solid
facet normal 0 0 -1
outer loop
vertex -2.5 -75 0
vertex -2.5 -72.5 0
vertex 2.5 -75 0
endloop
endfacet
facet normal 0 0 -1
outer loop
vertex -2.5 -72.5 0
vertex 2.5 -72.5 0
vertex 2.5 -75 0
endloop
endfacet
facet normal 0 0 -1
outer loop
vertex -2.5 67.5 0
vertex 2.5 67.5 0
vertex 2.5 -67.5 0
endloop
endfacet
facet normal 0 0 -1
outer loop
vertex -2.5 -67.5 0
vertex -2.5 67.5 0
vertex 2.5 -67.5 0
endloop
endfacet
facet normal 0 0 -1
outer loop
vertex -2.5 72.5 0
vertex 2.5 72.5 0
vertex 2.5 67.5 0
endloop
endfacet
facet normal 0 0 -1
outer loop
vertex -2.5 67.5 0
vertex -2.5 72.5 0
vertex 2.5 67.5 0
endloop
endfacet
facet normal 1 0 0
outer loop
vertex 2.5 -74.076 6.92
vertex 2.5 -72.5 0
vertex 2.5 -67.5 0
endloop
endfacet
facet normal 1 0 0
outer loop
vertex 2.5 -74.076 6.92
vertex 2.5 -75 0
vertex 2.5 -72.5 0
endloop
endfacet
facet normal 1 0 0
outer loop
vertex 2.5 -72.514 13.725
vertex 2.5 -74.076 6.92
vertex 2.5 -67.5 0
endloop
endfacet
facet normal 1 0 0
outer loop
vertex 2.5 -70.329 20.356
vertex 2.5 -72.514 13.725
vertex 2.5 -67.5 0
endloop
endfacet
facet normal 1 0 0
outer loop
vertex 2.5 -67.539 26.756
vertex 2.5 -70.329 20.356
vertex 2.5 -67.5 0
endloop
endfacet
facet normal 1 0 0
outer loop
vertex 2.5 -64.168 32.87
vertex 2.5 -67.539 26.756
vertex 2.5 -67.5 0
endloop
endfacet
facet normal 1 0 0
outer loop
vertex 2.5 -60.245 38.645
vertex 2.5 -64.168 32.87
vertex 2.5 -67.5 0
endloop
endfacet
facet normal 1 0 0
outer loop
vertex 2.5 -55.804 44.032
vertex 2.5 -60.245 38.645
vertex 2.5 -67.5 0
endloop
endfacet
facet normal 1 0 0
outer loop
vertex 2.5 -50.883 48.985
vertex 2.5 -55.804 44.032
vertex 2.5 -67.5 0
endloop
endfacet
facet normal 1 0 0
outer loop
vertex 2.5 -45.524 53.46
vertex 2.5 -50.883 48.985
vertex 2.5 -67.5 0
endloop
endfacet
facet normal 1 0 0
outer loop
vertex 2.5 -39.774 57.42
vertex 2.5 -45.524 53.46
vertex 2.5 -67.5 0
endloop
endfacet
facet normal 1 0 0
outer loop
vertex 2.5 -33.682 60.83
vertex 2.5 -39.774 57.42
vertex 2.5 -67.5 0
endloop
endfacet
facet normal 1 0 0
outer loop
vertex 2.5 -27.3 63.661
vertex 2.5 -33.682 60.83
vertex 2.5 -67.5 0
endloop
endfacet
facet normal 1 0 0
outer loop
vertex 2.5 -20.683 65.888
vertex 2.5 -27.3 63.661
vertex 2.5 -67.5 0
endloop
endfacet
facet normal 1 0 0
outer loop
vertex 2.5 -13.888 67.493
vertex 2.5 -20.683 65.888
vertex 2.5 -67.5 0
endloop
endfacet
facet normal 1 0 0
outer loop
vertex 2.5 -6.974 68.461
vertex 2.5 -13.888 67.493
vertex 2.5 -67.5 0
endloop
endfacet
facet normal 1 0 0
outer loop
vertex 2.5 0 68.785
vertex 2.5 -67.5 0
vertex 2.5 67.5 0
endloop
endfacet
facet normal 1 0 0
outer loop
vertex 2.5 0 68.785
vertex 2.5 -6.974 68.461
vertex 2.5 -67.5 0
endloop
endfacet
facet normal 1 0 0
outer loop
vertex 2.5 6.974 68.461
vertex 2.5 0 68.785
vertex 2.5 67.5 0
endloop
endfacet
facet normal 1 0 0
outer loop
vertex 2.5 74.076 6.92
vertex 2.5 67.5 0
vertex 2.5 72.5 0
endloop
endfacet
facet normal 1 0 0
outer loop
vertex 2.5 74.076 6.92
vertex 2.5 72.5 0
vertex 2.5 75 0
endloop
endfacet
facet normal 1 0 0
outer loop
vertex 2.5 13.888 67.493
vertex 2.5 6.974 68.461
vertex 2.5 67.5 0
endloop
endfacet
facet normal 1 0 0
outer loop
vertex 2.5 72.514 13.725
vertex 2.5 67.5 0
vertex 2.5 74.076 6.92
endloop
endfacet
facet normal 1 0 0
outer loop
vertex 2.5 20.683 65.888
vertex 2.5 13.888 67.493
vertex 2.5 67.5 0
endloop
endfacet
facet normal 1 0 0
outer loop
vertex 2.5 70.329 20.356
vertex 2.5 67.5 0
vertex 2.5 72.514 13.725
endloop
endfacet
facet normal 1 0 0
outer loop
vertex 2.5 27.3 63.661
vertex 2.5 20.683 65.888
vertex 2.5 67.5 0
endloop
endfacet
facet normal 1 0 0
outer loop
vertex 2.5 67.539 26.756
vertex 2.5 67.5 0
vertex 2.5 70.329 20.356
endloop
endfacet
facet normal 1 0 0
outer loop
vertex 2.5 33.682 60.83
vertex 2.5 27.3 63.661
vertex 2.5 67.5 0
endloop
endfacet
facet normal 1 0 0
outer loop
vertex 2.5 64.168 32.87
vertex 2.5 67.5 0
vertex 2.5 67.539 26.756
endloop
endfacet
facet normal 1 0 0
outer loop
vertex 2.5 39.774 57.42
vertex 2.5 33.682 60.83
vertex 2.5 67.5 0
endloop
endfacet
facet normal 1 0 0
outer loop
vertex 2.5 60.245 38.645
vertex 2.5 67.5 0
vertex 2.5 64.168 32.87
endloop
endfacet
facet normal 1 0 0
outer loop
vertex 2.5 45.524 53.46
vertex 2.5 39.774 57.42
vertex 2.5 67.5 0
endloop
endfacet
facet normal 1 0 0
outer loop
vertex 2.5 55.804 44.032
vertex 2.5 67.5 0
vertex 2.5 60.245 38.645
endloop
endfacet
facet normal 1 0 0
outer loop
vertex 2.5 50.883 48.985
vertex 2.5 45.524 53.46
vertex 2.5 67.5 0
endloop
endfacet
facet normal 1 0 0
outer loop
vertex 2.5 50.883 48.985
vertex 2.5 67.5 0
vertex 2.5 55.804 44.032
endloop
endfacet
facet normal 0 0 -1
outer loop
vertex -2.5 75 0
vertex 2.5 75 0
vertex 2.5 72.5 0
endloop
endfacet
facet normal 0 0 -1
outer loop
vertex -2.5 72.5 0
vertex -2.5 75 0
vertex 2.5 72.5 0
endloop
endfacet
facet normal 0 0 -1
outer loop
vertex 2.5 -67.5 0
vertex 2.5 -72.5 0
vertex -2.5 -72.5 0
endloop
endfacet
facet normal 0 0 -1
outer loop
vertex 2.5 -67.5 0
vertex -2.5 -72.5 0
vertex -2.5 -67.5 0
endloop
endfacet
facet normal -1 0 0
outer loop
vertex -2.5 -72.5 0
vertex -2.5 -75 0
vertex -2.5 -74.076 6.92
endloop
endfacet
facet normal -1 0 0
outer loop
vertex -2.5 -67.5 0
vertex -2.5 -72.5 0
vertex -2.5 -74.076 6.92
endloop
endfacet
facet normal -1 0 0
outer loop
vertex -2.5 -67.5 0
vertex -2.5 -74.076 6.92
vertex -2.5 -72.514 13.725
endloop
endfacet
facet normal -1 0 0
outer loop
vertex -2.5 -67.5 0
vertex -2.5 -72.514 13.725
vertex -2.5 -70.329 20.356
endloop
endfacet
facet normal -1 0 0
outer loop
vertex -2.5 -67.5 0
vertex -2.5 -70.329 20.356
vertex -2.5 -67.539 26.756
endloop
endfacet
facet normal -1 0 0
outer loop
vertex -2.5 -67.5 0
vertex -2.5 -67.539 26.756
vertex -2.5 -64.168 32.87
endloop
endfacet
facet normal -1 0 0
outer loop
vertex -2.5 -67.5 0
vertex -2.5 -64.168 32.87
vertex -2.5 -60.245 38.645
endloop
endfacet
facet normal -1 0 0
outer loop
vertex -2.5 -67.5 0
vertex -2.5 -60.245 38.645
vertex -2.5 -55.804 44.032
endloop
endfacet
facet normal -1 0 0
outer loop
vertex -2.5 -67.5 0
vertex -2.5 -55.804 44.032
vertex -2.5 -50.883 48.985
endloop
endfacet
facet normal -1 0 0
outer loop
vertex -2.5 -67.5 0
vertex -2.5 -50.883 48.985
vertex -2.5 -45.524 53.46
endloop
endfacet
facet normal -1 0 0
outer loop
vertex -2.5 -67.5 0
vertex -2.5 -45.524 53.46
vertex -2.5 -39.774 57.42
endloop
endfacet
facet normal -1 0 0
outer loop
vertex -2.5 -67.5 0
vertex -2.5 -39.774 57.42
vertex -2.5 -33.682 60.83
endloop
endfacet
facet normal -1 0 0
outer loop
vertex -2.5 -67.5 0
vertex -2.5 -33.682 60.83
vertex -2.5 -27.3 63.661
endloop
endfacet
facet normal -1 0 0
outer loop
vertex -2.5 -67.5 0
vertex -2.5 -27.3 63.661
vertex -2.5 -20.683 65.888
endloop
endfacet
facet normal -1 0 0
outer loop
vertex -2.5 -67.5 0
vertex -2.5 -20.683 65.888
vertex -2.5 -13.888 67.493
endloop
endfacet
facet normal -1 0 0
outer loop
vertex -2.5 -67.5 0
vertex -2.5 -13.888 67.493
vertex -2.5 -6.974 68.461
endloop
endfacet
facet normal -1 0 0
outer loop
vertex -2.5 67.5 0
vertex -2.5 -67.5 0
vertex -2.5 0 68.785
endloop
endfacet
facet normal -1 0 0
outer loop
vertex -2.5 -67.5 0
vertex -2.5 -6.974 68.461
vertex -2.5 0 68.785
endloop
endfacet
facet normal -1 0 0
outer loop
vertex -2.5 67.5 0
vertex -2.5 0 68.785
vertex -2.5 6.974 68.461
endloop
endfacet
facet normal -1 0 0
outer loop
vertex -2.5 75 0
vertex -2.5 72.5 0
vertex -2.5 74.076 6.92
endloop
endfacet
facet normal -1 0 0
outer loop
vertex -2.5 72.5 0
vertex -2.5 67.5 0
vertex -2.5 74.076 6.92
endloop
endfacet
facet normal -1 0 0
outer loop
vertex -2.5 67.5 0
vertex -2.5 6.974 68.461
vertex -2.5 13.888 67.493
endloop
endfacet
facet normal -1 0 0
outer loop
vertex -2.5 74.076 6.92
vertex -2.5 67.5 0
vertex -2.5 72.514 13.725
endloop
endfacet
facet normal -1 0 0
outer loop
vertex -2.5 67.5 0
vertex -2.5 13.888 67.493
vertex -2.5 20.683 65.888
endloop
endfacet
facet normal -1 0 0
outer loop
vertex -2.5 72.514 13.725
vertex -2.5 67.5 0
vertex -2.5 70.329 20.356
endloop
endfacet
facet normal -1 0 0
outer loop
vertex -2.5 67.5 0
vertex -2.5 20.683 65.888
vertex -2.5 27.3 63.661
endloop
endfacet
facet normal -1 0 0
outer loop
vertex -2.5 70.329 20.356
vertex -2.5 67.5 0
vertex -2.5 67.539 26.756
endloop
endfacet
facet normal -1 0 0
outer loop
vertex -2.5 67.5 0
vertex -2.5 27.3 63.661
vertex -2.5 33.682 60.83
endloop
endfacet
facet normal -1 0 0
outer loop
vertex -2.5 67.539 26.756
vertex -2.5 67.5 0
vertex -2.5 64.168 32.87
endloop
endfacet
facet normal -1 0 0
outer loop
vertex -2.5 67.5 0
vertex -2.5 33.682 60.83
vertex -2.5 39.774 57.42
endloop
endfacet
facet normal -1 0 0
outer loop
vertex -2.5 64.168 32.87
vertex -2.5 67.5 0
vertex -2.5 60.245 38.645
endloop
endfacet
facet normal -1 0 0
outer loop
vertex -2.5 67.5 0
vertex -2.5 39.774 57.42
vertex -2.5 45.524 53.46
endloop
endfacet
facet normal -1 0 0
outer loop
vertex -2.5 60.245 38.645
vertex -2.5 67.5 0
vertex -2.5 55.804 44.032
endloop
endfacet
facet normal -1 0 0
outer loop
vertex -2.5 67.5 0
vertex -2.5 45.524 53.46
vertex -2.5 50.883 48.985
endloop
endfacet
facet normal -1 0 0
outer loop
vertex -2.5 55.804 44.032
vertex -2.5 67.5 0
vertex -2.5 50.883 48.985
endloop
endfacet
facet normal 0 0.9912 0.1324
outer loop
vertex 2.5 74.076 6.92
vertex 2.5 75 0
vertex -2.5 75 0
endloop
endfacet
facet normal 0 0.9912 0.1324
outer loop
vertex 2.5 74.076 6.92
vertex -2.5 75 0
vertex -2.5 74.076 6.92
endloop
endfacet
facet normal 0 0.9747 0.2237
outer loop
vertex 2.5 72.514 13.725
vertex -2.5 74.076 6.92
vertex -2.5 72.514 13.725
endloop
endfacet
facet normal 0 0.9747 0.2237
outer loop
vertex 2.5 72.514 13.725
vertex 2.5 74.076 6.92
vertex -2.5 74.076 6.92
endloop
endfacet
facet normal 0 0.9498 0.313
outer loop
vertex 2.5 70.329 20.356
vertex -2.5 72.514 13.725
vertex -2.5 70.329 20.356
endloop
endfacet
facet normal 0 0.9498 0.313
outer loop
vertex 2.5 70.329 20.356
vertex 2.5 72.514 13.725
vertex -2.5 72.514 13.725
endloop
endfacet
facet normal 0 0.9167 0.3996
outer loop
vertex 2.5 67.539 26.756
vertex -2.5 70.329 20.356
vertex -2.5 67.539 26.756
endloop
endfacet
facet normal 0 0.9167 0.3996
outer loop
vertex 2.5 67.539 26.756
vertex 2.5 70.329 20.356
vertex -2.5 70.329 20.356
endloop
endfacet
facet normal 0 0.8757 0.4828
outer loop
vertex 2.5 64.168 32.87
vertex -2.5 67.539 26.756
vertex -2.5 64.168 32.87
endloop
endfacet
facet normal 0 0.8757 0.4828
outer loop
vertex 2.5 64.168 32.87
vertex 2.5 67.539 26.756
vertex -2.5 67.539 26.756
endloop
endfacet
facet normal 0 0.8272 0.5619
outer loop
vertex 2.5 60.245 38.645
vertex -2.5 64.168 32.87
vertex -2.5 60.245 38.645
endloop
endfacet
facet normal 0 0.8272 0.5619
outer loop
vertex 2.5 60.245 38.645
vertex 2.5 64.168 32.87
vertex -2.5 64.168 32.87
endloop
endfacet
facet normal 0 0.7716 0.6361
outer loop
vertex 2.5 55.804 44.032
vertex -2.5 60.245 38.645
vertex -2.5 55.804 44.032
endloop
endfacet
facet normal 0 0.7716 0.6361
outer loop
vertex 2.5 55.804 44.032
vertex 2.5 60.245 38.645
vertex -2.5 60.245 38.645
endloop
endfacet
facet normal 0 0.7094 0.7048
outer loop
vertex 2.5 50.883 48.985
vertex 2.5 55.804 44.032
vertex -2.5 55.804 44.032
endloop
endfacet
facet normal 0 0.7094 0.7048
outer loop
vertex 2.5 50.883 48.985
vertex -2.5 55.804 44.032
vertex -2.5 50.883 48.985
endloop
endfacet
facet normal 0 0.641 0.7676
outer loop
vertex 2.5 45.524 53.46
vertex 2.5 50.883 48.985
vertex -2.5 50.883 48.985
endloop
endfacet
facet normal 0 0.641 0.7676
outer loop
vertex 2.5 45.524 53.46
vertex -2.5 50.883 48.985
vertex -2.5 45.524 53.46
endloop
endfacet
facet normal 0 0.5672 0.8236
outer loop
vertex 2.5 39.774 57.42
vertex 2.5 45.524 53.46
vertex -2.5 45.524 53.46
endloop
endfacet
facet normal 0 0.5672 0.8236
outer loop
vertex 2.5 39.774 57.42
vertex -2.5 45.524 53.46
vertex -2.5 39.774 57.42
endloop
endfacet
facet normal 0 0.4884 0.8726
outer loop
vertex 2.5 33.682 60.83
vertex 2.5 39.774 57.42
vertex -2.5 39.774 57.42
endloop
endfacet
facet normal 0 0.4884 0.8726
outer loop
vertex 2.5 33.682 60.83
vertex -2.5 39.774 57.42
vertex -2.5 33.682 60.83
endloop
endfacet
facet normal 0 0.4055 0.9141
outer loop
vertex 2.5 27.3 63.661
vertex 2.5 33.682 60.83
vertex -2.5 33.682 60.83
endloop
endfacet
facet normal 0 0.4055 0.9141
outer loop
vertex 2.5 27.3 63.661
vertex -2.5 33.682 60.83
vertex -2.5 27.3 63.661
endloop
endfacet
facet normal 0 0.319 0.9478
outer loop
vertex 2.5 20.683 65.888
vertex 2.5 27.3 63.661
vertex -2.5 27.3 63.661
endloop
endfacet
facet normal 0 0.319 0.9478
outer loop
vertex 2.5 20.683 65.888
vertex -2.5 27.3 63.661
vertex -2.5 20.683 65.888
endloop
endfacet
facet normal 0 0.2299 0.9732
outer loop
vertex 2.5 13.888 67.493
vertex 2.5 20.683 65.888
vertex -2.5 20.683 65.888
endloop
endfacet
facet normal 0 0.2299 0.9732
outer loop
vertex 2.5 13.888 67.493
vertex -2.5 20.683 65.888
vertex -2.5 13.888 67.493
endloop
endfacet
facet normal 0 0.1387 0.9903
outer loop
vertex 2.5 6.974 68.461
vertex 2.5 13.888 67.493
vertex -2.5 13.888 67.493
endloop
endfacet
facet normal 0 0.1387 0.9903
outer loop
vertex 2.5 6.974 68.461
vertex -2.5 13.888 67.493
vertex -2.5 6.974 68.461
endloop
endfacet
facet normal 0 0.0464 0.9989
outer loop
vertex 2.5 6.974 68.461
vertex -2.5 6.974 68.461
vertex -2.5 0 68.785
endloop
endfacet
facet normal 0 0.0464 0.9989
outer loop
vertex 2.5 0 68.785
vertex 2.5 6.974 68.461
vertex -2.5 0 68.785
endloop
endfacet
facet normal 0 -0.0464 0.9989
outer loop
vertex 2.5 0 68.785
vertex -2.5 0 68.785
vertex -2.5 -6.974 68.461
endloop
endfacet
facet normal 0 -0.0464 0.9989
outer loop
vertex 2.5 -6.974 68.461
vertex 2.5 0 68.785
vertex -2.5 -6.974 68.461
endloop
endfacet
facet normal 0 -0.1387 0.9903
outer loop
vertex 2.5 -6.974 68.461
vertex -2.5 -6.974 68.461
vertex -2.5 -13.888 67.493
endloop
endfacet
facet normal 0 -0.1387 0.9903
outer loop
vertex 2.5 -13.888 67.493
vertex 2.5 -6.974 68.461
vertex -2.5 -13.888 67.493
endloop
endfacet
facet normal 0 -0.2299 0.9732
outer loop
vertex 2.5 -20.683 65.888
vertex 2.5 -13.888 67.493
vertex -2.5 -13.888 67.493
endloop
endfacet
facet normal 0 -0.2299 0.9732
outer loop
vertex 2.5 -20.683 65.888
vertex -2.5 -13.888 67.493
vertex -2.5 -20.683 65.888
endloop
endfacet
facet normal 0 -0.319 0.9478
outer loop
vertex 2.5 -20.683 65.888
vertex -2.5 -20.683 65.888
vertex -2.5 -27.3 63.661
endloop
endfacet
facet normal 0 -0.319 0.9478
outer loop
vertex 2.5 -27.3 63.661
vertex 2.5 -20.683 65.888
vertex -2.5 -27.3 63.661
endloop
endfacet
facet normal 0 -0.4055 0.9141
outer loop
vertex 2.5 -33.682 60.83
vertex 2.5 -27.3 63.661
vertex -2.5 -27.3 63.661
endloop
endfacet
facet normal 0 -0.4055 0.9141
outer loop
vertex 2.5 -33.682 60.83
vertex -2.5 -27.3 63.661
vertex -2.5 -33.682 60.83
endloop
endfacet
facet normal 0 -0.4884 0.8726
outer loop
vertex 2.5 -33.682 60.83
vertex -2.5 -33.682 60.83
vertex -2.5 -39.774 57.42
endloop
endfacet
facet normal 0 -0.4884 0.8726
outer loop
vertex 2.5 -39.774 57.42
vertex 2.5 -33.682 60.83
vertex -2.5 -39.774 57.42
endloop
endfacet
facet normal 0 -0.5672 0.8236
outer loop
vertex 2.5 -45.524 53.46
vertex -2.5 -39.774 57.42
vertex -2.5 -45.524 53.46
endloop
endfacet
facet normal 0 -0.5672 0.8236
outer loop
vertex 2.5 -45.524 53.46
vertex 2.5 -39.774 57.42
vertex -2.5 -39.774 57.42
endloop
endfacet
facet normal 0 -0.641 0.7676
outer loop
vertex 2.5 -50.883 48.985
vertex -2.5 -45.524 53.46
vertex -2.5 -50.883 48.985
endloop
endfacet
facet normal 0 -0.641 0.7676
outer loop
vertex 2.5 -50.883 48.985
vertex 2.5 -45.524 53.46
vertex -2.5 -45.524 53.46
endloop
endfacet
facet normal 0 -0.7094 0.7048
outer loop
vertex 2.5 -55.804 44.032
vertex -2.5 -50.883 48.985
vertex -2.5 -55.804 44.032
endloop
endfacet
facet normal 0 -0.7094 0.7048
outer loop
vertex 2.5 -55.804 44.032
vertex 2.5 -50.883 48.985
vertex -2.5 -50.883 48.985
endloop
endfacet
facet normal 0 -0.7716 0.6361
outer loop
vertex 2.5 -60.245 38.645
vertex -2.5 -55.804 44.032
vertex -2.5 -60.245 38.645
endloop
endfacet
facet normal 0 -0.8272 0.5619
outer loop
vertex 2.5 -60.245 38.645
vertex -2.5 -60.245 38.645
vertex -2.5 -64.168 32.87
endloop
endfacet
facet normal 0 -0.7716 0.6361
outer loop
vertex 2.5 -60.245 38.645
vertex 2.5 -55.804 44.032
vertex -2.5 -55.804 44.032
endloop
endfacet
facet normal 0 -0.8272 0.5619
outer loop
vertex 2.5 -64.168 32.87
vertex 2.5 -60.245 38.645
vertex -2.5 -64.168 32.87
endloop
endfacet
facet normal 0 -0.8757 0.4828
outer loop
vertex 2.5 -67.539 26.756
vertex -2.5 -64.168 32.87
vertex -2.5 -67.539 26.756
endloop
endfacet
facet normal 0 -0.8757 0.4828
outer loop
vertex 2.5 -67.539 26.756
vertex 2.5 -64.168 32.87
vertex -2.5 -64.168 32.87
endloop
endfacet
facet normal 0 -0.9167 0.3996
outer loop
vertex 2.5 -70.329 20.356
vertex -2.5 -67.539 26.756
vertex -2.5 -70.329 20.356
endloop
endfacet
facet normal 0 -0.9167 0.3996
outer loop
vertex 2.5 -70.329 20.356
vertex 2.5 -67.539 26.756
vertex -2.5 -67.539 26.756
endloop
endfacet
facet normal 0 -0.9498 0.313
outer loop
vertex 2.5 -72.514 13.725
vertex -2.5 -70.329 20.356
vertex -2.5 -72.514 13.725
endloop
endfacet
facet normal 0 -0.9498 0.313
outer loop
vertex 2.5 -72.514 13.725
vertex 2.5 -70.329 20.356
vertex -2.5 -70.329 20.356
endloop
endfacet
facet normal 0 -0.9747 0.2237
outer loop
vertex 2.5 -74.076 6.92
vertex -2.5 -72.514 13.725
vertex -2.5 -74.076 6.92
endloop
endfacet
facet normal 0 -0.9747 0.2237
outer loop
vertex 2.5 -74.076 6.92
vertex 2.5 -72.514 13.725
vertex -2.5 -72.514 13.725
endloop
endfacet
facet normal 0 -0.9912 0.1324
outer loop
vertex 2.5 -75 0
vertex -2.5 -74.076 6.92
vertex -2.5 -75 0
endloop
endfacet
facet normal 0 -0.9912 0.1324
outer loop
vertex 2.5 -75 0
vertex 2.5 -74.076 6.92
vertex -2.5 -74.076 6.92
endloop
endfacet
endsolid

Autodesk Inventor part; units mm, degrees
ref_plane "YZ Plane" through (0, 0, 0) normal (1, 0, 0) x (0, 1, 0)
ref_plane "Work Plane1" through (-2.5, 0, 34.3925) normal (1, 0, 0) x (0, 1, 0)
sketch "Sketch1" plane through (-2.5, 0, 34.3925) normal (1, 0, 0) x (0, 1, 0)
  arc A0 (72.5, -34.3925) -> (-72.5, -34.3925) centre (0, -45.8883) ccw projected
  line L0 (72.5, -34.3926) -> (67.5, -34.3926) projected
  line L1 (67.5, -34.3925) -> (-67.5, -34.3925) projected
  line L2 (-72.5, -34.3926) -> (-67.5, -34.3926) projected
  line L3 (67.5, -34.3926) -> (-67.5, -34.3926) projected
  arc A1 (75, -34.3926) -> (-75, -34.3926) centre (0, -40.8883) ccw projected
  line L4 (75, -34.3926) -> (-75, -34.3926) projected
  arc A2 (72.5, -34.3925) -> (-72.5, -34.3925) centre (0, -45.8883) ccw projected
  line L5 (-72.5, -34.3925) -> (72.5, -34.3925) projected
  point P0 (0, -34.3925)
  point P1 (-72.5, -34.3926)
  point P2 (72.5, -34.3926)
ref_plane "Work Plane2" through (2.5, -67.5, -250) normal (1, 0, 0) x (0, 1, 0)
ref_plane "Work Plane3" through (-2.5, -72.3, -250) normal (-1, 0, 0) x (0, 0, 1)
extrude "Extrusion1" add sketch "Sketch1" against normal up to surface (5 mm away) from surface at 5
properties part number "Lid2" material "Plastic, Opaque White"
